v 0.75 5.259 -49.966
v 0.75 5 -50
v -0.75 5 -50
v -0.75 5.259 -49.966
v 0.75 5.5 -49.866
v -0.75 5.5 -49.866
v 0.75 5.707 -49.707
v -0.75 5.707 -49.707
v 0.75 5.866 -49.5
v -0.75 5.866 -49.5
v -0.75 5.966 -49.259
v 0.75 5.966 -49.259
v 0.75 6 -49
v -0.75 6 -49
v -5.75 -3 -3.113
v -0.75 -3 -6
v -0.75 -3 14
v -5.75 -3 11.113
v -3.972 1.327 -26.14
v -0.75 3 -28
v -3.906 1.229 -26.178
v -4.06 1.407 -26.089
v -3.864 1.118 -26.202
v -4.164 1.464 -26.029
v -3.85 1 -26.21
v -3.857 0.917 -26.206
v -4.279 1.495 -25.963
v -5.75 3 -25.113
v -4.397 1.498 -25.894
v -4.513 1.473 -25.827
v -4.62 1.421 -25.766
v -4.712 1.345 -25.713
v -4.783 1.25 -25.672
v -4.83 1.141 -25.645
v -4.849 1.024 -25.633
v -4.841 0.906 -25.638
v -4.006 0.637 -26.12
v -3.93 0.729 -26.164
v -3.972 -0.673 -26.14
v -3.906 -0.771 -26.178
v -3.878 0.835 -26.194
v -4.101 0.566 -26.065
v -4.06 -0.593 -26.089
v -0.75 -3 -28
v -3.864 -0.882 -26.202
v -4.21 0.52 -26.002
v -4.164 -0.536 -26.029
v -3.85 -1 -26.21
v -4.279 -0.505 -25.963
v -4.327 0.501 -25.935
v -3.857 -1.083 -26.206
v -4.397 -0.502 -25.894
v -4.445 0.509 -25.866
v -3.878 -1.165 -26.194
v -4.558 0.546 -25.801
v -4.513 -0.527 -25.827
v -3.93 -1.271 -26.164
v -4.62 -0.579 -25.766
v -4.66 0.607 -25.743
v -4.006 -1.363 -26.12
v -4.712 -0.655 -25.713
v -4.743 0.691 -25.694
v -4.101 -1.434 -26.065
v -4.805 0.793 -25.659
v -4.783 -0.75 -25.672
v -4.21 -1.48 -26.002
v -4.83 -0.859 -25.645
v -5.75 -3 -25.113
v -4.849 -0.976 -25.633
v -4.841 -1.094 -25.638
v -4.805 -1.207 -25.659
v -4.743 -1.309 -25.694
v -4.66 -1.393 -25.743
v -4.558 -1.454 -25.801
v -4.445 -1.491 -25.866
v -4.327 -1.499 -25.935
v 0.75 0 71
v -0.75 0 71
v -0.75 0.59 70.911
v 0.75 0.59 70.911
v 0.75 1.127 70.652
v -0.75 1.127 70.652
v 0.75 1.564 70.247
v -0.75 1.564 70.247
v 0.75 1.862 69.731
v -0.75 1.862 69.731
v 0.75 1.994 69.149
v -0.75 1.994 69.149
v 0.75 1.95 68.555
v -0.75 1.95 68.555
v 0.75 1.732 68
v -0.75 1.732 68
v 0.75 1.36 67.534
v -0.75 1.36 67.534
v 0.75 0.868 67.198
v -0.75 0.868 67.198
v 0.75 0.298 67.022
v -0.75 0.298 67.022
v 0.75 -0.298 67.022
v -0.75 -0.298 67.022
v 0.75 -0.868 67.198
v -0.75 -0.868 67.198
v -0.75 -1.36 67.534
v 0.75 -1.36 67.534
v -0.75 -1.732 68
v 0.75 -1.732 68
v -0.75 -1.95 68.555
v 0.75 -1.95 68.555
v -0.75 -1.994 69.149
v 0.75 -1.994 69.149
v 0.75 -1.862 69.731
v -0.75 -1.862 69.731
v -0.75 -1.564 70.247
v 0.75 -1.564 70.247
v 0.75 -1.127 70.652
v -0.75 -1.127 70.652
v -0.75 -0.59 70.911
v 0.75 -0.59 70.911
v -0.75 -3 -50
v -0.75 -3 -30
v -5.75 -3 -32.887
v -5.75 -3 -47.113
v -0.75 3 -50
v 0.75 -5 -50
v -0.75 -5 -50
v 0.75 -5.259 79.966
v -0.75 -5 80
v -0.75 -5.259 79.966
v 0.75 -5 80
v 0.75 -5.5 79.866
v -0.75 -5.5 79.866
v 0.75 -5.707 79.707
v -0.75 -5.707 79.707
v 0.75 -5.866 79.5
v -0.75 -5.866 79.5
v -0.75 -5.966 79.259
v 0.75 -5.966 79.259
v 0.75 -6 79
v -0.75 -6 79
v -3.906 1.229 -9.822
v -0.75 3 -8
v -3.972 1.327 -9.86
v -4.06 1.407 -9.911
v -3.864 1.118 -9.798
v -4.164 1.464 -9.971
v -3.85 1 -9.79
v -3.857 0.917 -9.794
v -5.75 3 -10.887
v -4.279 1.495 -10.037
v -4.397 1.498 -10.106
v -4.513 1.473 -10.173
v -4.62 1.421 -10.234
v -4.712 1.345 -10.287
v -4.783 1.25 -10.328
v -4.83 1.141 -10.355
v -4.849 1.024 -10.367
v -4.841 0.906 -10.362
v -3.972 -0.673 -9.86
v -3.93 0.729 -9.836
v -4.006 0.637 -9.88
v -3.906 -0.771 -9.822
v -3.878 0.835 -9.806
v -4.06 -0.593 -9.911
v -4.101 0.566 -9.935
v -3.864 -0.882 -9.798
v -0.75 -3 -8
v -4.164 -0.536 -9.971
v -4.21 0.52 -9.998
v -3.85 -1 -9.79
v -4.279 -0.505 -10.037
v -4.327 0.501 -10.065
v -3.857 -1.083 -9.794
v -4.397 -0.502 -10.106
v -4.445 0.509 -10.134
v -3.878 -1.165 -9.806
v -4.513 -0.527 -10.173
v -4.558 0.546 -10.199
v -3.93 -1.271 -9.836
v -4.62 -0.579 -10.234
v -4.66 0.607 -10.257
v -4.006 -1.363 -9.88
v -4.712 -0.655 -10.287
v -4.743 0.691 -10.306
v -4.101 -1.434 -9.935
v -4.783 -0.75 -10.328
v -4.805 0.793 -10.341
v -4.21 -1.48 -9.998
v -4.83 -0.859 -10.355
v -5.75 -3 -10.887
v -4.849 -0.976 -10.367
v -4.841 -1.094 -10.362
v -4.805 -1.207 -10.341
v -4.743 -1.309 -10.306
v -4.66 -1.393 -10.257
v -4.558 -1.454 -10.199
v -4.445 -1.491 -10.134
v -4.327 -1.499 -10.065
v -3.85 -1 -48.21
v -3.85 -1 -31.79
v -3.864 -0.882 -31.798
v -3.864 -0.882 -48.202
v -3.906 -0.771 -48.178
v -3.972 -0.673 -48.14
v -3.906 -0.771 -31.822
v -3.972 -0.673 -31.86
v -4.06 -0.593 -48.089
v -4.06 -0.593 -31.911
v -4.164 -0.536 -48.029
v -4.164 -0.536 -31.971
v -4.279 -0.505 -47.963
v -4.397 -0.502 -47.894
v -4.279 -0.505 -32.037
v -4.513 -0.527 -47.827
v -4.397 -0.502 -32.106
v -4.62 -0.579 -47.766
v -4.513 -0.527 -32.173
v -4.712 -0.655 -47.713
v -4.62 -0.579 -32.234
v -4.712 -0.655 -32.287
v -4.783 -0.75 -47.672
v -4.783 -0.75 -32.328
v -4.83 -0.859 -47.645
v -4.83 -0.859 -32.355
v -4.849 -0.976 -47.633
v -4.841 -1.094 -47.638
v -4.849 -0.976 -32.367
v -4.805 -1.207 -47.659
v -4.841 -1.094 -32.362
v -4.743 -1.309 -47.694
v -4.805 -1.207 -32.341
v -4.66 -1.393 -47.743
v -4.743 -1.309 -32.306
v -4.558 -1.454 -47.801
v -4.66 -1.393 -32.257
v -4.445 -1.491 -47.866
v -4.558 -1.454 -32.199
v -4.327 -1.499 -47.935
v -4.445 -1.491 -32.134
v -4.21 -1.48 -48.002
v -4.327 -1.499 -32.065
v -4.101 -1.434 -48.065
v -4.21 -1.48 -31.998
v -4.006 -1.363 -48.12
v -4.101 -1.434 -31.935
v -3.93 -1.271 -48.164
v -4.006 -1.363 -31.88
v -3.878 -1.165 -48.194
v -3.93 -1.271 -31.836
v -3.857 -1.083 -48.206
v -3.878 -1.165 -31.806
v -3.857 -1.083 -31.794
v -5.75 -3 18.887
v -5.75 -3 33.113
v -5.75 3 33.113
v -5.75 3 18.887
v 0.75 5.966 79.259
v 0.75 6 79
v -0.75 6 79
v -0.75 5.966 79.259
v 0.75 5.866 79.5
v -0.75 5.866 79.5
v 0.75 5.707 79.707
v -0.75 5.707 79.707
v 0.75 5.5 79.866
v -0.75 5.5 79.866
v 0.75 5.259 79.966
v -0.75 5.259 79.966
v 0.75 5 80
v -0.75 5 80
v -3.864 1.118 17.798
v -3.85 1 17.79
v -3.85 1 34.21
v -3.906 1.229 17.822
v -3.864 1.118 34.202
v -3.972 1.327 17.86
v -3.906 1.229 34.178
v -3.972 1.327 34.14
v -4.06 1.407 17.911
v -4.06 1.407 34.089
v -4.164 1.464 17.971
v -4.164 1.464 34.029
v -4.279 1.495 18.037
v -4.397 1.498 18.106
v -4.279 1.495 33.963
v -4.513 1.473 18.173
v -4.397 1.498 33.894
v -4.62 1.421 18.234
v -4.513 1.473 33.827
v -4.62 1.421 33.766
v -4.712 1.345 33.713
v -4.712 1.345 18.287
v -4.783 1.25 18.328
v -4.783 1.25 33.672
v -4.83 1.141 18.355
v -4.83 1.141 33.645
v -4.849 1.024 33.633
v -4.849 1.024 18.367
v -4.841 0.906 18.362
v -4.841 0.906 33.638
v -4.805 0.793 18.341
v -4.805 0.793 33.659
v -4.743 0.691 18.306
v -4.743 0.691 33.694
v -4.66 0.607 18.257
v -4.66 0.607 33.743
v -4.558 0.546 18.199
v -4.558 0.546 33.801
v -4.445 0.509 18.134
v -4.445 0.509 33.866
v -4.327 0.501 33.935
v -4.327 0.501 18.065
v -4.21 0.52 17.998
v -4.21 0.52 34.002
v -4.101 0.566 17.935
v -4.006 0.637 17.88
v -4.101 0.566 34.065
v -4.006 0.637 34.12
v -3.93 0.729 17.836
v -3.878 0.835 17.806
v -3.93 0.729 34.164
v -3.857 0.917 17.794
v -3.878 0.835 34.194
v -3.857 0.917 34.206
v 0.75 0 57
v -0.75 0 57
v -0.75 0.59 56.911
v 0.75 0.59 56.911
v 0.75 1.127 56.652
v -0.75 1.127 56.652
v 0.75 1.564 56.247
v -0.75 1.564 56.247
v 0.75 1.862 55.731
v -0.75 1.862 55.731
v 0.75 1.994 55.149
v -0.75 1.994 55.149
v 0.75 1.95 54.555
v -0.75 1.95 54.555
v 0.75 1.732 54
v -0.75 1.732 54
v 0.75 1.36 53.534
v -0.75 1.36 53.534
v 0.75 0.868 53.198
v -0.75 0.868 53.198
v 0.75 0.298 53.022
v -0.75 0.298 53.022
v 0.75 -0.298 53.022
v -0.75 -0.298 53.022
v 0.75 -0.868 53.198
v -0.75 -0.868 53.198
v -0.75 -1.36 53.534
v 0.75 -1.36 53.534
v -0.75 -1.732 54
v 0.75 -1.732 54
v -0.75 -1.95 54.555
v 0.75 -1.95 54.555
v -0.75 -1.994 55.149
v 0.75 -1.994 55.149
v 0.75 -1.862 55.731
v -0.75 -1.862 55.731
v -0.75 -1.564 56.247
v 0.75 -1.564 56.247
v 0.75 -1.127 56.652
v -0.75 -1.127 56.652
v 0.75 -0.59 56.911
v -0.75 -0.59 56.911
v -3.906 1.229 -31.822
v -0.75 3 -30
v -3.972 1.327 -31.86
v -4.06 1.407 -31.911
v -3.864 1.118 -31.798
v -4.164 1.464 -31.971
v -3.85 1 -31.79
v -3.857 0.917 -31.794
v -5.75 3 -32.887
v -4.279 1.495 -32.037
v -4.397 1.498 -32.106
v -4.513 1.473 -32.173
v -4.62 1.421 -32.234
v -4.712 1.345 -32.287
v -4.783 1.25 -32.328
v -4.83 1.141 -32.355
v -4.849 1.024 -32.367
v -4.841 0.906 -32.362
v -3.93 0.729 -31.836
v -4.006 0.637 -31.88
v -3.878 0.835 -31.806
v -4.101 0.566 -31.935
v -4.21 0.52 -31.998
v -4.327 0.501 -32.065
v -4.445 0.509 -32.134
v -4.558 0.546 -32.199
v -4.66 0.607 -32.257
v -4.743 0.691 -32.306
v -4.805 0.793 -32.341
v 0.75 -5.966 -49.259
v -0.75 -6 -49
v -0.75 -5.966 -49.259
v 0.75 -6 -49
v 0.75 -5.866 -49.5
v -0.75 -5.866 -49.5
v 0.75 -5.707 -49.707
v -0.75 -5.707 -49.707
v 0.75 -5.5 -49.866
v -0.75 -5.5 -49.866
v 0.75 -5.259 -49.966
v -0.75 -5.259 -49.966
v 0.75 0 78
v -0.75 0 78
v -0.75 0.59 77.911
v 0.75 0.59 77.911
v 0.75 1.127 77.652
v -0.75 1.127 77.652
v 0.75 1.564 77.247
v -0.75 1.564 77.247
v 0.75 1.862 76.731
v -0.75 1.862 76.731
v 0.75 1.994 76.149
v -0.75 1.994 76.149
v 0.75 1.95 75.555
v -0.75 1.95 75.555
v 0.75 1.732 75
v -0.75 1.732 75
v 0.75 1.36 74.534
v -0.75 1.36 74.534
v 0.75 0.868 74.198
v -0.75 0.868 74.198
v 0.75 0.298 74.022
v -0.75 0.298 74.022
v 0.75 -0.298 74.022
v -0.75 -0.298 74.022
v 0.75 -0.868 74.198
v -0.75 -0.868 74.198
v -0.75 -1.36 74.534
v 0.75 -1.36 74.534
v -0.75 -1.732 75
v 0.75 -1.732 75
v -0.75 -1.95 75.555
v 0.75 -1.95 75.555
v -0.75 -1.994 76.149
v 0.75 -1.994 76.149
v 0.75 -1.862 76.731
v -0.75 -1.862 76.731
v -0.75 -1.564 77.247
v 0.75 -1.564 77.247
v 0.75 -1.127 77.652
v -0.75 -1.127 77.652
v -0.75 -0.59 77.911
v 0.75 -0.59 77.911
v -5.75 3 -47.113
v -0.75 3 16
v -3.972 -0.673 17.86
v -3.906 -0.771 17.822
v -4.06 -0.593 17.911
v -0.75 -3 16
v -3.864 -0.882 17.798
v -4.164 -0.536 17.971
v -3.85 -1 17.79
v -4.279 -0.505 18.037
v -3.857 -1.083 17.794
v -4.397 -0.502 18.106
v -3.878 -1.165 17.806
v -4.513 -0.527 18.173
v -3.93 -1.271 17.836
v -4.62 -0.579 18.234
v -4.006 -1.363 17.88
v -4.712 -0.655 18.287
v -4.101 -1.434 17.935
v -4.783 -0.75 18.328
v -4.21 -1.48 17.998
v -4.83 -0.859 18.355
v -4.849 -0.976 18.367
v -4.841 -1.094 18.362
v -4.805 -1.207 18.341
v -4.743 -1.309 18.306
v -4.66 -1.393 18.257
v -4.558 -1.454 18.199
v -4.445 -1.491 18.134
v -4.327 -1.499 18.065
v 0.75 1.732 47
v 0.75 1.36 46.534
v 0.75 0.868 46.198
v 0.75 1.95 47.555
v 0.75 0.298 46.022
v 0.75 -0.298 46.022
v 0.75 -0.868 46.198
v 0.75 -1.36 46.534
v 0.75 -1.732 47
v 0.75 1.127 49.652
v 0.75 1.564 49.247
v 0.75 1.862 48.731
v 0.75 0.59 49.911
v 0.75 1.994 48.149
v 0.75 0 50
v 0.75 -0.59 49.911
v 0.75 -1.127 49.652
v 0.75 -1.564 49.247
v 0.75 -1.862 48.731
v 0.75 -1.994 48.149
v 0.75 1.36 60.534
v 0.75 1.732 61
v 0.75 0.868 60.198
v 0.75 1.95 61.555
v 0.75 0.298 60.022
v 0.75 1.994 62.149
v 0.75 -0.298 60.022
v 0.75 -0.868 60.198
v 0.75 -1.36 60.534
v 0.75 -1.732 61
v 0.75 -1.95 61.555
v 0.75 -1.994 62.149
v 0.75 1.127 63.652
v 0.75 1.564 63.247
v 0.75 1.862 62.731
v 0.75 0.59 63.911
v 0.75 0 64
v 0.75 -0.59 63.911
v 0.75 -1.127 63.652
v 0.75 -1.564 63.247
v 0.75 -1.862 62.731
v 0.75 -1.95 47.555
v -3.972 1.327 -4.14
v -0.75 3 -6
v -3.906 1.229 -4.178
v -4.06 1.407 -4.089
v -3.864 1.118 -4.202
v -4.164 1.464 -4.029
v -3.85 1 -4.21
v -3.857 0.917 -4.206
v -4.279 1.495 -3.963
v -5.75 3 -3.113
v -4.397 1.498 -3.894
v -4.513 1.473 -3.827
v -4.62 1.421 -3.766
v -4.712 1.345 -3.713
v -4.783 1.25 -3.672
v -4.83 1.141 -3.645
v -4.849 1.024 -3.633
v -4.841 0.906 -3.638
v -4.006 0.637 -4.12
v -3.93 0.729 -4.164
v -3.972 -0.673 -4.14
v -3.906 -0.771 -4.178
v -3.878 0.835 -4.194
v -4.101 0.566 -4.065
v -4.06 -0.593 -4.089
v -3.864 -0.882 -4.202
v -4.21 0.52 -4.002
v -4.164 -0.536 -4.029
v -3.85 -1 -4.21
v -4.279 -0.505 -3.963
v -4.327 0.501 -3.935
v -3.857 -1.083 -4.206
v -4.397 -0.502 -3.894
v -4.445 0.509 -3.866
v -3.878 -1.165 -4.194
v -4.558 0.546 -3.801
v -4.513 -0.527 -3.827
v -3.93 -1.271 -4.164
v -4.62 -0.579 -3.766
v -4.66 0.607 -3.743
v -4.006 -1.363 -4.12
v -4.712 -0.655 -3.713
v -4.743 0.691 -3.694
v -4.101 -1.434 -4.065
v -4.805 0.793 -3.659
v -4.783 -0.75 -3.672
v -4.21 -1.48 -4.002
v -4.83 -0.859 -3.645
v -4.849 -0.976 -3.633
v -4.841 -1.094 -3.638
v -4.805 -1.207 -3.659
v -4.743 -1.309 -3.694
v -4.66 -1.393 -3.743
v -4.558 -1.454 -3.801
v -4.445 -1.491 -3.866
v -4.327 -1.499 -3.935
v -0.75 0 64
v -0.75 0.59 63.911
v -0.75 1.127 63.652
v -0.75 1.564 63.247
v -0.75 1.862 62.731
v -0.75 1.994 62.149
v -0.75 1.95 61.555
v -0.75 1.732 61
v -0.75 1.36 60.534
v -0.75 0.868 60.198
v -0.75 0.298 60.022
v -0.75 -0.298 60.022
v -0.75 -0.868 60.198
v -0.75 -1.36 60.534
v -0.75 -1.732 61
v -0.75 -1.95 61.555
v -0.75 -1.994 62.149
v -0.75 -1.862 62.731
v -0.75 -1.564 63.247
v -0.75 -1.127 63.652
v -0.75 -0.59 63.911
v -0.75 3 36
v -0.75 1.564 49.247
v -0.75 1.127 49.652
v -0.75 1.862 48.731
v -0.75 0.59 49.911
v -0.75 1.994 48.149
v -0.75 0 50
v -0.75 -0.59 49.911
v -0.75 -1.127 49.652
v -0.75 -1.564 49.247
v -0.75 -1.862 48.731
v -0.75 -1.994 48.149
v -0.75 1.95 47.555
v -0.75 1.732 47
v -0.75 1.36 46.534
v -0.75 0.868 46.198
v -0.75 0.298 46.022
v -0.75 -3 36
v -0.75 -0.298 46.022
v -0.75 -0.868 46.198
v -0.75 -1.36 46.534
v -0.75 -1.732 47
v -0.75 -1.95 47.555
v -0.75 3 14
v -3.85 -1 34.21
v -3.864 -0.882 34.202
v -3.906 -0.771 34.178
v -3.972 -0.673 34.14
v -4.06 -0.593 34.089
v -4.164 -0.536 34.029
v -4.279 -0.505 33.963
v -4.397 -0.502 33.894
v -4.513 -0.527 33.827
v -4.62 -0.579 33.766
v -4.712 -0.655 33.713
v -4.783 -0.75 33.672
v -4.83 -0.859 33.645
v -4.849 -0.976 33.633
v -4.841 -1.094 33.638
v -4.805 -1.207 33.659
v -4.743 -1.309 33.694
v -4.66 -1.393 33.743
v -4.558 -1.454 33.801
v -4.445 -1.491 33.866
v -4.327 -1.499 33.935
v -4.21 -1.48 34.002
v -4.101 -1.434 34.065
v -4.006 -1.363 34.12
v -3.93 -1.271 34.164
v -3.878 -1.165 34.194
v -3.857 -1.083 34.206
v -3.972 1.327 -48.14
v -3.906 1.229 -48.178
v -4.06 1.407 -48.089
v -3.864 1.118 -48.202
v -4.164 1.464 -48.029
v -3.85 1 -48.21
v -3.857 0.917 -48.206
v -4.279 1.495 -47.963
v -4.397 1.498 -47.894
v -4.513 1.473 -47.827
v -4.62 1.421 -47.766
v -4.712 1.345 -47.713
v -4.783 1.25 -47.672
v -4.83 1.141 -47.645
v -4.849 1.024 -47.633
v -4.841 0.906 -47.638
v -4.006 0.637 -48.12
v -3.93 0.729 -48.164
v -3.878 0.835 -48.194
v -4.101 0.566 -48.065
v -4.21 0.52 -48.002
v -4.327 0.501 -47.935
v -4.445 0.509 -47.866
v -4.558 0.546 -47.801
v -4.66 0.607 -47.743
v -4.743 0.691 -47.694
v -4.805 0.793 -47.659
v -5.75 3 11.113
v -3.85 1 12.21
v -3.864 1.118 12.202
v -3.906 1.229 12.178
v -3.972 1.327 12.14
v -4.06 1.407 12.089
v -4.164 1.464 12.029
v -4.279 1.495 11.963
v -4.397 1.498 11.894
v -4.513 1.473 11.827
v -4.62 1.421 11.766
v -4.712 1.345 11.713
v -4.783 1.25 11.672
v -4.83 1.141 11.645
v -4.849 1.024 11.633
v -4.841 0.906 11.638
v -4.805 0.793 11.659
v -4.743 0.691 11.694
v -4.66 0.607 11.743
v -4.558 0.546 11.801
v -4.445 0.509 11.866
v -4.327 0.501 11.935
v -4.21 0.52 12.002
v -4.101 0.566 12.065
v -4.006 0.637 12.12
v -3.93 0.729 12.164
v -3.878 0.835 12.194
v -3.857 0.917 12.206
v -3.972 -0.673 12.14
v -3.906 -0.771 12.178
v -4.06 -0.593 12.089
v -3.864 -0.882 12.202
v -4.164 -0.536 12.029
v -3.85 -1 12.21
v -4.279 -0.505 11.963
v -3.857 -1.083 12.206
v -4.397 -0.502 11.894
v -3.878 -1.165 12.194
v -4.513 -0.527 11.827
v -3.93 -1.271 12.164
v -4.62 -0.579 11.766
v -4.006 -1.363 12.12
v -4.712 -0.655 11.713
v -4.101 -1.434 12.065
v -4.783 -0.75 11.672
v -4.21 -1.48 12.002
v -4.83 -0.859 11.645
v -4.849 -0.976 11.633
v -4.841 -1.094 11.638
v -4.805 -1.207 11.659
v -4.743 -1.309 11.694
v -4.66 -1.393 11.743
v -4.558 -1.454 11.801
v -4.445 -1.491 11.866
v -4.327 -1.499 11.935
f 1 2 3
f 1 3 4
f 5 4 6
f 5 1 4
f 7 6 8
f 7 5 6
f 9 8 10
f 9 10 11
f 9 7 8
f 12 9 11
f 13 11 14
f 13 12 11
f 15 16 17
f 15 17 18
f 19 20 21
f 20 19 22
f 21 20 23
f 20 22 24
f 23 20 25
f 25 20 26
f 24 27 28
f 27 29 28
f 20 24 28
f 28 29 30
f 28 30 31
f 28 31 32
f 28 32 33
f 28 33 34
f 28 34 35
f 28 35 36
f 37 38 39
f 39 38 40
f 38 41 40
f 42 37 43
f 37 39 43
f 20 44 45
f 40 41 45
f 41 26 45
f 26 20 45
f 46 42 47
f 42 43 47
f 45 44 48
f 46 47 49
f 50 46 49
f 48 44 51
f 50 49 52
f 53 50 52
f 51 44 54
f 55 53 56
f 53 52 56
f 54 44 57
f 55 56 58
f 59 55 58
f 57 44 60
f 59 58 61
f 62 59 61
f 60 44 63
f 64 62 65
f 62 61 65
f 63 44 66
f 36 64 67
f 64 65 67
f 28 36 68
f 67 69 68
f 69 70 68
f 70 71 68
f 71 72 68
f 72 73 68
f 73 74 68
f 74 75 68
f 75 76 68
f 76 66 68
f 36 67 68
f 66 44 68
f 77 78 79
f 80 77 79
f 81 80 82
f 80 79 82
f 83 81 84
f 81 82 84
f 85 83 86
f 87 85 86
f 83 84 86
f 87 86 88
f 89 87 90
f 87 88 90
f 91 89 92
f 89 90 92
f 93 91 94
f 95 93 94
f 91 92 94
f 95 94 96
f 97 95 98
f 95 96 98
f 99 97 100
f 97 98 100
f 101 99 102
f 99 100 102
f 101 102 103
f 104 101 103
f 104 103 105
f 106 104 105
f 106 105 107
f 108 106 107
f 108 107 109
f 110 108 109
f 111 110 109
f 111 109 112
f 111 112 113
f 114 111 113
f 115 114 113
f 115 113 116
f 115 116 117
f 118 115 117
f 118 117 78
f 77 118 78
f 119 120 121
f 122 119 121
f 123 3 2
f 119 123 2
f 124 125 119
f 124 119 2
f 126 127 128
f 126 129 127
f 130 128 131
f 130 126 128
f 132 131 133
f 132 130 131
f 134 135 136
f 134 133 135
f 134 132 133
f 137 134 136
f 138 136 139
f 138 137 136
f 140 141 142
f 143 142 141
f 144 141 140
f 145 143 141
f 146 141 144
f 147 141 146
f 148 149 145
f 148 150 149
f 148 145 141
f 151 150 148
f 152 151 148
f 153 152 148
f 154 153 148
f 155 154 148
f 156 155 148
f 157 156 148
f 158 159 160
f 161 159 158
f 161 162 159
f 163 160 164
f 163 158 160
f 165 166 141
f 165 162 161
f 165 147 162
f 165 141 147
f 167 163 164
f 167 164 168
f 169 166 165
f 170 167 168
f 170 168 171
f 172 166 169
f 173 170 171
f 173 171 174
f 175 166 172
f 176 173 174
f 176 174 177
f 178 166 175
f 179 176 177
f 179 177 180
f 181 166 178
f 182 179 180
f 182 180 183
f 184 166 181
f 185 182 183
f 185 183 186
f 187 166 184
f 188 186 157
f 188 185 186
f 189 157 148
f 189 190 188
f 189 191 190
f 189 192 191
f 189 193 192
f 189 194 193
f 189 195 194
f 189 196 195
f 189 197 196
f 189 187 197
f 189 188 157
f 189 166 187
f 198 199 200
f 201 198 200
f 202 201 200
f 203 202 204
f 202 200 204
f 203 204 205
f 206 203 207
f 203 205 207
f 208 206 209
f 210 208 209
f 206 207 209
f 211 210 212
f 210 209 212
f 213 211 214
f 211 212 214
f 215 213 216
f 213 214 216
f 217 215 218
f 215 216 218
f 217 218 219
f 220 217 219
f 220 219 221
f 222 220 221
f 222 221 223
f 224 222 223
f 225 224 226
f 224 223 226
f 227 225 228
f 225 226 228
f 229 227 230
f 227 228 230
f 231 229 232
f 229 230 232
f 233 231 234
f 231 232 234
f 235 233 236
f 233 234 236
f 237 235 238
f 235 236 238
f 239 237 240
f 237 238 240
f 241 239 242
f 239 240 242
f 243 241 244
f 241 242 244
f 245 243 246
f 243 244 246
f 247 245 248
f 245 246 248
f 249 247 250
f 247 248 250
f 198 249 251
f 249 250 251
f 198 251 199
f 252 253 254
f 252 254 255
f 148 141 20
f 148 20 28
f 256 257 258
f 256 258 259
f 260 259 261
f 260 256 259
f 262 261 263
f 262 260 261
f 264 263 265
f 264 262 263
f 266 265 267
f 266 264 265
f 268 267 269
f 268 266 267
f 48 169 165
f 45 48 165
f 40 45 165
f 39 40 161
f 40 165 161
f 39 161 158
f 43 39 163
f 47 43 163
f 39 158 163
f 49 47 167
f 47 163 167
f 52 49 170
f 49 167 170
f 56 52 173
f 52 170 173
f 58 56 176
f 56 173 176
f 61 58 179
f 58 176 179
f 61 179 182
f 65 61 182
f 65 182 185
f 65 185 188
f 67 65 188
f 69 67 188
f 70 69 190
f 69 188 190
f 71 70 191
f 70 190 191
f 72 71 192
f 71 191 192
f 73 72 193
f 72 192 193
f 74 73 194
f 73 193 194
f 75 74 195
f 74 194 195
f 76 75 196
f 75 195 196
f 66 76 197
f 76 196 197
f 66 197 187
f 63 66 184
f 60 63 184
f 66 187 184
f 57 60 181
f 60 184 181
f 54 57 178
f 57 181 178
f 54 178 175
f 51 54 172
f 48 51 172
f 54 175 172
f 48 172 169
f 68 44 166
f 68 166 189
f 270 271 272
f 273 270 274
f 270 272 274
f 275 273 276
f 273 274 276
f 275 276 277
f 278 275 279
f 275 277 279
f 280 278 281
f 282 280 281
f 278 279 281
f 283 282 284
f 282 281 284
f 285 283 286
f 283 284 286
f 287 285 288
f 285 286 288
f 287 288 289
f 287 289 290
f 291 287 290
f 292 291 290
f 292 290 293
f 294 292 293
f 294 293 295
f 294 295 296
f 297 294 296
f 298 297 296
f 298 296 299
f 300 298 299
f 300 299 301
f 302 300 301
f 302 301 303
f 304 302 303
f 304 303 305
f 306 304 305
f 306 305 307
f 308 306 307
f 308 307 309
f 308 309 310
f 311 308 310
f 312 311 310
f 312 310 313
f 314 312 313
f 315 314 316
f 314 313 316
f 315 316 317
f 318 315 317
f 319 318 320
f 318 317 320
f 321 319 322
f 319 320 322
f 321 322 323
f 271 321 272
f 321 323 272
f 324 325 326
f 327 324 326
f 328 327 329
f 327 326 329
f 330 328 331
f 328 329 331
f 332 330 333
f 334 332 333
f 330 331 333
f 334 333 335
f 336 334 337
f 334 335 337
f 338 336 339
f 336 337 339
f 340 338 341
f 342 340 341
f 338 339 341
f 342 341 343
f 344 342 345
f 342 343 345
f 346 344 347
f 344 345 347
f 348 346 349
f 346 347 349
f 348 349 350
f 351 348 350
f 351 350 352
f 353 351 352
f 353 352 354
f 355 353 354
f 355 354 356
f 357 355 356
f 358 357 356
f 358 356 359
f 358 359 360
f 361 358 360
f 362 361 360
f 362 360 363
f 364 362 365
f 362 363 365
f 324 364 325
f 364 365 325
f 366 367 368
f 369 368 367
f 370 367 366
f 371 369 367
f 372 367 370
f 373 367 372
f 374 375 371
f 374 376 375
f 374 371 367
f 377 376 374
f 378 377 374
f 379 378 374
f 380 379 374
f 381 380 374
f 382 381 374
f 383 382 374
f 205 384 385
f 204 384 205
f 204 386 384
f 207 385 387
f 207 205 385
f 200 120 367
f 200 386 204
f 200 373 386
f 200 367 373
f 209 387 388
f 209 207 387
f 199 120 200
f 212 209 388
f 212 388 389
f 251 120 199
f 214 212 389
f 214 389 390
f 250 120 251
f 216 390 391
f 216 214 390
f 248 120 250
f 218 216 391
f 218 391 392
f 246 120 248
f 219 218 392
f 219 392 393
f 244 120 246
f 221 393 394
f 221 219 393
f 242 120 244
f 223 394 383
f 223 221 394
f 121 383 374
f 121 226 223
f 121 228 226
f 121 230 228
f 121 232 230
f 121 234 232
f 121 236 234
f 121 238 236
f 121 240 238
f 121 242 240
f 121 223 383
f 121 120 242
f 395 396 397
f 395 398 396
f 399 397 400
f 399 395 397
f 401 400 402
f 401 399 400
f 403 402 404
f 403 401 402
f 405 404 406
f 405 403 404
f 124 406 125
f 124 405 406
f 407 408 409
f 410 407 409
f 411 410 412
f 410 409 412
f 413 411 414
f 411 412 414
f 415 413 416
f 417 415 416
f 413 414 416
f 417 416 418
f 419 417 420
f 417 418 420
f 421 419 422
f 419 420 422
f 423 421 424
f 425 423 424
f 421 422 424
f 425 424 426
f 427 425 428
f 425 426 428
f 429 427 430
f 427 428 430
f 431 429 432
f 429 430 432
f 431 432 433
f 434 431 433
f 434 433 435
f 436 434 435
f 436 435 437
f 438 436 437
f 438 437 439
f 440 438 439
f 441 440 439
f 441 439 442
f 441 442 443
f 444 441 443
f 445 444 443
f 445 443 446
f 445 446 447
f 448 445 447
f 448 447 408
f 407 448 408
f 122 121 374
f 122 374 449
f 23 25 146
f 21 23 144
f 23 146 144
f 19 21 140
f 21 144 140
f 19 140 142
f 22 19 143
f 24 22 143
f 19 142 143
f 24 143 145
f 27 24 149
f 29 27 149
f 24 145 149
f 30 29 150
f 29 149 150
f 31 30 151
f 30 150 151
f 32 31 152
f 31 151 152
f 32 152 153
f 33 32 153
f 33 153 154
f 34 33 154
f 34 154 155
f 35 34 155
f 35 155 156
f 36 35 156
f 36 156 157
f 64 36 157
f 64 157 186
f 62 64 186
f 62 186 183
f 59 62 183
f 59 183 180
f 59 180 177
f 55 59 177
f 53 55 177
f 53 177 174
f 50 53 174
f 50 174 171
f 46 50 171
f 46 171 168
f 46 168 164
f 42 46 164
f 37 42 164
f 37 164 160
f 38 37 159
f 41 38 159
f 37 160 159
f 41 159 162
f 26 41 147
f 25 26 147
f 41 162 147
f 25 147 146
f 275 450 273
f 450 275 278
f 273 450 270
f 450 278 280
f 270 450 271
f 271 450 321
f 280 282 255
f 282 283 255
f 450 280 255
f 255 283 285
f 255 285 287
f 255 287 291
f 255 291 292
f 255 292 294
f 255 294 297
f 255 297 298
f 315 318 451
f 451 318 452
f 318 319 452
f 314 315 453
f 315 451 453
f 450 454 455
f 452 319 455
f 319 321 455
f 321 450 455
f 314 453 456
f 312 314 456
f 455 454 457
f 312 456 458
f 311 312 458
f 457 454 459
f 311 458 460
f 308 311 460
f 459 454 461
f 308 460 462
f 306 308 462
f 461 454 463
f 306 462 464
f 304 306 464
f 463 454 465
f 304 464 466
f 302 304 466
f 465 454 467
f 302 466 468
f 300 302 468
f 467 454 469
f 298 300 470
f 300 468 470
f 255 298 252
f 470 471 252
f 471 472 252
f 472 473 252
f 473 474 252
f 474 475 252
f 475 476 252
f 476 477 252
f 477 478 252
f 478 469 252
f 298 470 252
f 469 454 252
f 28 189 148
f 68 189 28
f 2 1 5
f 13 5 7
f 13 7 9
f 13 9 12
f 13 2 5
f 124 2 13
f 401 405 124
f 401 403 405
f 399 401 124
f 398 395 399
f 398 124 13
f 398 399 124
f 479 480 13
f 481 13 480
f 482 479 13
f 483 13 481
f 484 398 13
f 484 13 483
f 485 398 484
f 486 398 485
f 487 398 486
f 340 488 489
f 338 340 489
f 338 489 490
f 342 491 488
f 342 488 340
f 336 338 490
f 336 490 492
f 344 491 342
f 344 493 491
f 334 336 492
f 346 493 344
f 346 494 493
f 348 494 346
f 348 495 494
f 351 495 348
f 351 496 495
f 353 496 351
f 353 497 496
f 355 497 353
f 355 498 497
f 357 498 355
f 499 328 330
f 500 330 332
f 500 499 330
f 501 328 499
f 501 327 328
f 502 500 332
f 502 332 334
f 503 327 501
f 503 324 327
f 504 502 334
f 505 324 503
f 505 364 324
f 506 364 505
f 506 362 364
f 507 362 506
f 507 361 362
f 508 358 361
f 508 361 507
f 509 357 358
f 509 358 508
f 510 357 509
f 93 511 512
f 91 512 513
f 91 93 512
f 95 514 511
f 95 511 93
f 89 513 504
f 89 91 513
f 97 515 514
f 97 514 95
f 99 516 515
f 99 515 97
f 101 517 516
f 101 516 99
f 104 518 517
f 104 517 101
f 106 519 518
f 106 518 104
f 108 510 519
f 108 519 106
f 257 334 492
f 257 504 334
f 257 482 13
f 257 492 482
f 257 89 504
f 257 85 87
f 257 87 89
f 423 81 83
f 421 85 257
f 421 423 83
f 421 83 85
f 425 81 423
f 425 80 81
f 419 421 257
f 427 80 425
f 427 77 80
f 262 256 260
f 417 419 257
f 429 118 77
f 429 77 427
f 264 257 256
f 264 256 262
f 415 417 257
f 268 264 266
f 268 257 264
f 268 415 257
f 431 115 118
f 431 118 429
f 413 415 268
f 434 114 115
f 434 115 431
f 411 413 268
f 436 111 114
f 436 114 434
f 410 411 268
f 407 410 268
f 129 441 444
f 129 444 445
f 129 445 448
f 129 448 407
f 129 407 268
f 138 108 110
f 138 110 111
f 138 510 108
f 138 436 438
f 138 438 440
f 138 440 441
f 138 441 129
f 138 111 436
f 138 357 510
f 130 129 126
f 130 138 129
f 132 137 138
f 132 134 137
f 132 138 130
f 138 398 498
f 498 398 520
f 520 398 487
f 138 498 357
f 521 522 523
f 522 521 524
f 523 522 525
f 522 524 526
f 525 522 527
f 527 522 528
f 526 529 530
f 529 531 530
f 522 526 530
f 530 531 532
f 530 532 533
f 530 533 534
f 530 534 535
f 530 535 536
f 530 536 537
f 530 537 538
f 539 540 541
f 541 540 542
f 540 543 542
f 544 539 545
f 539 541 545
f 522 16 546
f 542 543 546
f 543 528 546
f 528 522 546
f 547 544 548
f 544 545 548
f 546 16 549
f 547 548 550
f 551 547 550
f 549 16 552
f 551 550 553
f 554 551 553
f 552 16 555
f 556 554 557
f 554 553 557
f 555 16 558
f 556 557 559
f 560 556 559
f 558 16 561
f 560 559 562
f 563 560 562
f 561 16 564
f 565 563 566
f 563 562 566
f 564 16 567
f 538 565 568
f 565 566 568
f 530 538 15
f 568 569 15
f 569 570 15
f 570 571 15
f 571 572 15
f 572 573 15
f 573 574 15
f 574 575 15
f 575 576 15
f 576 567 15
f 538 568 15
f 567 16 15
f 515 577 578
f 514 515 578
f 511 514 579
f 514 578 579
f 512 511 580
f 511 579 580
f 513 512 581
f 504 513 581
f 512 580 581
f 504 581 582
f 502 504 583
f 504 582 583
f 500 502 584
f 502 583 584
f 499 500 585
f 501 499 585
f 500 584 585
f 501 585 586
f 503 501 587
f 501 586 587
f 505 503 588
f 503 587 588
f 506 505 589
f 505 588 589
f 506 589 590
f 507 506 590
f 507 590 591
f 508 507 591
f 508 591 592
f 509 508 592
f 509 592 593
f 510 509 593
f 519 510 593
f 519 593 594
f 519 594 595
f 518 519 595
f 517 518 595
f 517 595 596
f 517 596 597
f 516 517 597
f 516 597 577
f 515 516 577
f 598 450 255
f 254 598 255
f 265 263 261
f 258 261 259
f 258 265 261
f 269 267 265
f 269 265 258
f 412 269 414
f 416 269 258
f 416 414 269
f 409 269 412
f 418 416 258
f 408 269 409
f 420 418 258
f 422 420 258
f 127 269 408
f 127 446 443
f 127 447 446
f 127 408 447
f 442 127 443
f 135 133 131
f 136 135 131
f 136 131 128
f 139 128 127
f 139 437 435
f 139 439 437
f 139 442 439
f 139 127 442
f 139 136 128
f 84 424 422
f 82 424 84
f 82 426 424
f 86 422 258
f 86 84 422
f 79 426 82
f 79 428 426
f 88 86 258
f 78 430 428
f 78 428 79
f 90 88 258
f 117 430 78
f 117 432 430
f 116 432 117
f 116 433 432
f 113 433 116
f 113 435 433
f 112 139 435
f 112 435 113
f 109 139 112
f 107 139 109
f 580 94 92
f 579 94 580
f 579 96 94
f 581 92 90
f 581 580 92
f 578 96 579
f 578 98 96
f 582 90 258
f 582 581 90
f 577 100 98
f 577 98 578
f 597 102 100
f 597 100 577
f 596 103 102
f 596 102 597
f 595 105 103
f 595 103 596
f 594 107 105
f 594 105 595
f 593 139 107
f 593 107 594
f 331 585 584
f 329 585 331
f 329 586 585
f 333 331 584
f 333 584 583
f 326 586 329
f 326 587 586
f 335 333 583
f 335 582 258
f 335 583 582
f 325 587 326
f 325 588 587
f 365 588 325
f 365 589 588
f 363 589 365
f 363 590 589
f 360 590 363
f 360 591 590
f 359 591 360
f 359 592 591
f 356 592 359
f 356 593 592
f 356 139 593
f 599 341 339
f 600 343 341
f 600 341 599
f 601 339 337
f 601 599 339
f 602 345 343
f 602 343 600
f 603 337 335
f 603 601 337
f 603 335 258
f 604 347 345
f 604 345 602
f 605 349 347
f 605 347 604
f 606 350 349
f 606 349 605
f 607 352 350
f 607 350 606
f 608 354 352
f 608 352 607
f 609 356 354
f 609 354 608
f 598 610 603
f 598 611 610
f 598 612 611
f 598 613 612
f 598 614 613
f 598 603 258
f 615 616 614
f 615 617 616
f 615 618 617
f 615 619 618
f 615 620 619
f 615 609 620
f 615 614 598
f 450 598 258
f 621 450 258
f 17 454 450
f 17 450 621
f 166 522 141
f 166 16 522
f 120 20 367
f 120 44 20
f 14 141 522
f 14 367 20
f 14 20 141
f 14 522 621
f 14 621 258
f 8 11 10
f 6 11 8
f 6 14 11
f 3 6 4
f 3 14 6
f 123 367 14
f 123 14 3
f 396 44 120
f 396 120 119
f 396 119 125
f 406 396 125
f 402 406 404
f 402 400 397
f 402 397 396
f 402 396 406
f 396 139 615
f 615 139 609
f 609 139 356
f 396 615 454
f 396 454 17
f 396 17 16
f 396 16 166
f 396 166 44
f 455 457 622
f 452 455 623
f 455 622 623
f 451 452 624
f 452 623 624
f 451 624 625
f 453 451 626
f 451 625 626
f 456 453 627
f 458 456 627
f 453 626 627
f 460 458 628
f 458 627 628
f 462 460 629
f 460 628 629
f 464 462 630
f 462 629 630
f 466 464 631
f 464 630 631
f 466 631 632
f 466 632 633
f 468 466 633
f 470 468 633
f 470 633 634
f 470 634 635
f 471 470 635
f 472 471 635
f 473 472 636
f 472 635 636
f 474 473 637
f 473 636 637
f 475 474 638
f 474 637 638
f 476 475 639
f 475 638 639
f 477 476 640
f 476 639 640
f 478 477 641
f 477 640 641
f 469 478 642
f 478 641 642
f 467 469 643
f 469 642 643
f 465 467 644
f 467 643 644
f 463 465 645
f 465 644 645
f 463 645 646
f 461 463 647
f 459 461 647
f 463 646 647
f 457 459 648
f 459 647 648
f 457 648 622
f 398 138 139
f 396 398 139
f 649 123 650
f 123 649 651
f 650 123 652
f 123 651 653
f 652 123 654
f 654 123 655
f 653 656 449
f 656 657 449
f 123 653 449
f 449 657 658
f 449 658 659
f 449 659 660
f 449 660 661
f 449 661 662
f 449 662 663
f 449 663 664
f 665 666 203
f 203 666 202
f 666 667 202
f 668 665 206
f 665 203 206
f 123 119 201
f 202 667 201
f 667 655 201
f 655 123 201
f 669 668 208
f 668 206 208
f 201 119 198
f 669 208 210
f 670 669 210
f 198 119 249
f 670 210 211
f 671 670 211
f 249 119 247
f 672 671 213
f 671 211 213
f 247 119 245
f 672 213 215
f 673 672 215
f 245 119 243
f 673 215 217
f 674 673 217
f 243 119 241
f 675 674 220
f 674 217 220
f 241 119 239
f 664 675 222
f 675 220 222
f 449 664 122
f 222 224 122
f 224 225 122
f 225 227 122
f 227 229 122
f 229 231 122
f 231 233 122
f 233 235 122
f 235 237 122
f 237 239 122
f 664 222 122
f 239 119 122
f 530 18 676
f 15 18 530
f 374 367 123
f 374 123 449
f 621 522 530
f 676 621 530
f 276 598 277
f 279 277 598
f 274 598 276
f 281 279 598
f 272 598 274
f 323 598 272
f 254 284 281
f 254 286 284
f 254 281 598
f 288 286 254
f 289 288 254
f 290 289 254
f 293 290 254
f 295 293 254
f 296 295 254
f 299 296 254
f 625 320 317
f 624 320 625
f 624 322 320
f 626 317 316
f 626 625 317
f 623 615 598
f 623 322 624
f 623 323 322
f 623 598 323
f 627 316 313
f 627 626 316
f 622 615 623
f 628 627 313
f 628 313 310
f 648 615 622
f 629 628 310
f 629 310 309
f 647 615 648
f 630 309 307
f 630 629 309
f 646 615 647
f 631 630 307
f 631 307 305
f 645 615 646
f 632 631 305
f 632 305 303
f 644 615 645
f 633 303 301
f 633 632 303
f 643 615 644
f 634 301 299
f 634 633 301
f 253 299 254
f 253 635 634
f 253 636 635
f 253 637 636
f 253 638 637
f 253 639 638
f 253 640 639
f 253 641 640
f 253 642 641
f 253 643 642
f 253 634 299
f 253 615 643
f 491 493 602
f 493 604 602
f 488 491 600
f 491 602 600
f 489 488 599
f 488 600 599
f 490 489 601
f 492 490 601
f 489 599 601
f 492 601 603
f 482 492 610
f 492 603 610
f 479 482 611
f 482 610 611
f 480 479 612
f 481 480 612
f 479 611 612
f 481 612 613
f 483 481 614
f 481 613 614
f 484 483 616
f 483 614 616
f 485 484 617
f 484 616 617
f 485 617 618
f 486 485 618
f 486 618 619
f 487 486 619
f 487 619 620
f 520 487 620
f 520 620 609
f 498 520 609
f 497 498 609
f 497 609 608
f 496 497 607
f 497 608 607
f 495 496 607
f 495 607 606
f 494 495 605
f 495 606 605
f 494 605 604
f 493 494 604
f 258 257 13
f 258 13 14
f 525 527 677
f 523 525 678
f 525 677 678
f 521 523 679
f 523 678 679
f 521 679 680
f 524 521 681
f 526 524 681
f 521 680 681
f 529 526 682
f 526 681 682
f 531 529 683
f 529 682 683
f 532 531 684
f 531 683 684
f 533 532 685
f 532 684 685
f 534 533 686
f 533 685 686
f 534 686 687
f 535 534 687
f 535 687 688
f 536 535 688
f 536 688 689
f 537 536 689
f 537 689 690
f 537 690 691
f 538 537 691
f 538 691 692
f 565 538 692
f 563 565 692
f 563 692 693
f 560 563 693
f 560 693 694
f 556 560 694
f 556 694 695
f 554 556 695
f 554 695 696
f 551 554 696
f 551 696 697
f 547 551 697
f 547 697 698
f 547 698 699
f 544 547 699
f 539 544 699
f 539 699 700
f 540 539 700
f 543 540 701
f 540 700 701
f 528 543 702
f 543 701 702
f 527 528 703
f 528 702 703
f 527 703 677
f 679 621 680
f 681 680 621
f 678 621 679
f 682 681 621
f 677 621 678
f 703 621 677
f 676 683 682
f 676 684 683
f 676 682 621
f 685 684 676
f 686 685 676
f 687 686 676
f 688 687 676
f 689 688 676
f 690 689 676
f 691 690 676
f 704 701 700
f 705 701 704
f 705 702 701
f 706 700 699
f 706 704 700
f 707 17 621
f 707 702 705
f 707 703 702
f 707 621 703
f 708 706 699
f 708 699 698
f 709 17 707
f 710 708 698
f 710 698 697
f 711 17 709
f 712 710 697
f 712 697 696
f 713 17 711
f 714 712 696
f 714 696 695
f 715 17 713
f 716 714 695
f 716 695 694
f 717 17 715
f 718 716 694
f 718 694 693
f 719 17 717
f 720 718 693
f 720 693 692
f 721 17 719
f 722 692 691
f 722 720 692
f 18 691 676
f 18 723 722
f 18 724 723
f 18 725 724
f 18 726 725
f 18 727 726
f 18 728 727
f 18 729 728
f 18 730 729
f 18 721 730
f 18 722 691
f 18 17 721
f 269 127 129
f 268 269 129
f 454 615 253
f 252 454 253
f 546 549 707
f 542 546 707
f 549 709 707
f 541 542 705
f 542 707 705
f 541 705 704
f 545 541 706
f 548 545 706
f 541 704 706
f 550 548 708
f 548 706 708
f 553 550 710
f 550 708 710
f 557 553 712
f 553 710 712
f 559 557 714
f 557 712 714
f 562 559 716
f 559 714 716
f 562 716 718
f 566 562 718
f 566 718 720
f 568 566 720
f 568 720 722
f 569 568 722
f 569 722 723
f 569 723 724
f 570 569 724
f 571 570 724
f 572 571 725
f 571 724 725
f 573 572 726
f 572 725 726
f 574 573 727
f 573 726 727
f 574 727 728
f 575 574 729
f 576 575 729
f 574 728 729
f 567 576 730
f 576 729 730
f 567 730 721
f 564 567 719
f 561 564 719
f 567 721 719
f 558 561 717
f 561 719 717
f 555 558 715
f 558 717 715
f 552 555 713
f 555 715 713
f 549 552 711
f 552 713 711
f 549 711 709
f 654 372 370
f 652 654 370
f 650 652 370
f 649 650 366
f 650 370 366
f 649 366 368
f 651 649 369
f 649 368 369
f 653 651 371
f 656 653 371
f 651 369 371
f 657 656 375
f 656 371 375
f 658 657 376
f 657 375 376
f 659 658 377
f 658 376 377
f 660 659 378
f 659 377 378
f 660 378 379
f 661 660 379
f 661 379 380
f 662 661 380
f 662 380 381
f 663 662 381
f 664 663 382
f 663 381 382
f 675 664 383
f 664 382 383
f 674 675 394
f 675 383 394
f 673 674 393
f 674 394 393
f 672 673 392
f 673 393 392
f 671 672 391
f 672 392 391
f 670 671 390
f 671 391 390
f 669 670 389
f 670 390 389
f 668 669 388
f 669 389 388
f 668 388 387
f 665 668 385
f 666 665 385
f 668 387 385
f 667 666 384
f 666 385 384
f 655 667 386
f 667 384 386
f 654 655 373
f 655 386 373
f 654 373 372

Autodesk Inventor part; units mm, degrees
ref_plane "YZ Plane" through (0, 0, 0) normal (1, 0, 0) x (0, 1, 0)
ref_plane "XZ Plane" through (0, 0, 0) normal (0, 1, 0) x (-1, 0, 0)
ref_plane "XY Plane" through (0, 0, 0) normal (0, 0, 1) x (1, 0, 0)
sketch "Sketch3" plane through (0, 0, 0) normal (0, 1, 0) x (-1, 0, 0)
  line L0 (0.75, -50) -> (-0.75, -50)
  line L1 (-0.75, -50) -> (-0.75, 50)
  line L2 (-0.75, 50) -> (0.75, 50)
  line L3 (0.75, 50) -> (0.75, -50)
  line L4 (0.75, -50) -> (-0.75, 50) construction
  line L5 (-0.75, -50) -> (0.75, 50) construction
  line L6 (0.75, -50) -> (0.75, -30)
  line L7 (0.75, -30) -> (5.75, -30)
  line L8 (5.75, -30) -> (5.75, -50)
  line L9 (5.75, -50) -> (0.75, -50)
  line L10 (0.75, -30) -> (6.2137, -30) construction
  line L11 (0.75, -50) -> (5.75, -47.1132)
  line L12 (0.75, -50) -> (6.5235, -50) construction
  line L13 (0.75, -30) -> (5.75, -32.8868)
  line L14 (0.75, -30) -> (5.6279, -30) construction
  line L15 (0.75, -28) -> (5.75, -25.1132)
  line L16 (5.75, -8) -> (5.75, -28)
  line L17 (0.75, -8) -> (5.75, -10.8868)
  line L18 (0.75, -6) -> (5.75, -3.1132)
  line L19 (5.75, 14) -> (5.75, -6)
  line L20 (0.75, 14) -> (5.75, 11.1132)
  line L21 (0.75, 16) -> (5.75, 18.8868)
  line L22 (5.75, 36) -> (5.75, 16)
  line L23 (0.75, 36) -> (5.75, 33.1132)
  line L24 (-0.75, 50) -> (0.75, 50)
  line L25 (0.75, 50) -> (0.75, 80)
  line L26 (0.75, 80) -> (-0.75, 80)
  line L27 (-0.75, 80) -> (-0.75, 50)
  line L28 (-1.5102, -55) -> (-1.5102, 40) construction
  line L29 (-0.5, 40) -> (-0.6183, 40) construction
  point P0 (0, 0)
  point P1 (0.75, 14)
  point P2 (0.75, -8)
  point P3 (0.75, -28)
  point P4 (-1.5102, -45.1132)
  point P5 (-1.5102, -34.8868)
  point P6 (-1.5102, -12.8868)
  point P7 (-1.5102, -23.1132)
  point P8 (-1.5102, 9.1132)
  point P9 (-1.5102, -1.1132)
  point P10 (-1.5102, 31.1132)
  point P11 (-1.5102, 20.8868)
  point P12 (5.75, 26)
  point P13 (5.75, 4)
  dimension "d17" = 1.5
  dimension "d18" = 100
  dimension "d19" = 20
  dimension "d20" = 5
  dimension "d22" = 30
  dimension "d23" = 30
  dimension "d26" = 22
  dimension "d35" = 1.5
  dimension "d36" = 30
  dimension "d61" = 95
  dimension "d62" = 2
  dimension "d63" = 2
  dimension "d66" = 22
  dimension "d74" = 22
  dimension "d75" = 130
extrude "Extrusion1" add sketch "Sketch3" along normal mid plane 12 contours L0 L1 L2 L3 | L27 L26 L25 L2
extrude "Extrusion2" add sketch "Sketch3" along normal mid plane 6 contours L3 L13 L8 L11 | L3 L17 L16 L15 | L23 L22 L21 L3 | L3 L20 L19 L18
sketch "Sketch4" plane through (-0.75, -6, 80) normal (-1, 0, 0) x (0, 0, 1)
  circle A0 centre (-32, 6) radius 2
  line L0 (-44, 9) -> (-44, 3) projected
  line L1 (-44, 6) -> (0, 6) construction
  line L2 (0, 12) -> (0, 0) construction
  circle A1 centre (-25, 6) radius 2
  circle A2 centre (-18, 6) radius 2
  circle A3 centre (-11, 6) radius 2
  circle A4 centre (-4, 6) radius 2
  point P0 (-80, 6)
  dimension "d37" = 4
  dimension "d38" = 12
  dimension "d41" = 7
extrude "Extrusion3" cut sketch "Sketch4" against normal blind 6
sketch "Sketch5" plane through (-0.75, 6, 80) normal (0, 0, 1) x (1, 0, 0)
  line L0 (-5, -9) -> (-5, -3) construction
  line L1 (0, -9) -> (0, -3) construction
  line L2 (-5, -9) -> (0, -9) construction
  line L3 (0, -9) -> (0, -3) construction
  line L4 (0, -3) -> (-5, -3) construction
  line L5 (-5, -3) -> (-5, -9) construction
  line L6 (0, -9) -> (-5, -3) construction
  line L7 (-5, -9) -> (0, -3) construction
  line L8 (-2.5, -6) -> (-3.6, -6) construction
  line L9 (-3.6, -6) -> (-3.6, -7) construction
  circle A0 centre (-3.6, -7) radius 0.5
  circle A1 centre (-3.6, -5) radius 0.5
  point P0 (0.75, -6)
  dimension "d48" = 6
  dimension "d49" = 1.1
  dimension "d58" = 1
  dimension "d59" = 1
extrude "Extrusion4" cut sketch "Sketch5" against normal blind 150
fillet "Fillet1" radius 1 4 edges at (0, 6, 80) (0, -6, 80) (0, -6, -50) (0, 6, -50)
sketch "Sketch6" plane through (-0.75, -3, -50) normal (0, 0, -1) x (-1, 0, 0)
  line L0 (-1.5, 1) -> (-1.5, 5) projected
  circle A0 centre (-1.5, 3) radius 1
  point P0 (-0.75, 3)
  point P1 (-2, 4)
  point P2 (-2, 2)
  dimension "d71" = 2
properties part number "actuator_bone_joint"
